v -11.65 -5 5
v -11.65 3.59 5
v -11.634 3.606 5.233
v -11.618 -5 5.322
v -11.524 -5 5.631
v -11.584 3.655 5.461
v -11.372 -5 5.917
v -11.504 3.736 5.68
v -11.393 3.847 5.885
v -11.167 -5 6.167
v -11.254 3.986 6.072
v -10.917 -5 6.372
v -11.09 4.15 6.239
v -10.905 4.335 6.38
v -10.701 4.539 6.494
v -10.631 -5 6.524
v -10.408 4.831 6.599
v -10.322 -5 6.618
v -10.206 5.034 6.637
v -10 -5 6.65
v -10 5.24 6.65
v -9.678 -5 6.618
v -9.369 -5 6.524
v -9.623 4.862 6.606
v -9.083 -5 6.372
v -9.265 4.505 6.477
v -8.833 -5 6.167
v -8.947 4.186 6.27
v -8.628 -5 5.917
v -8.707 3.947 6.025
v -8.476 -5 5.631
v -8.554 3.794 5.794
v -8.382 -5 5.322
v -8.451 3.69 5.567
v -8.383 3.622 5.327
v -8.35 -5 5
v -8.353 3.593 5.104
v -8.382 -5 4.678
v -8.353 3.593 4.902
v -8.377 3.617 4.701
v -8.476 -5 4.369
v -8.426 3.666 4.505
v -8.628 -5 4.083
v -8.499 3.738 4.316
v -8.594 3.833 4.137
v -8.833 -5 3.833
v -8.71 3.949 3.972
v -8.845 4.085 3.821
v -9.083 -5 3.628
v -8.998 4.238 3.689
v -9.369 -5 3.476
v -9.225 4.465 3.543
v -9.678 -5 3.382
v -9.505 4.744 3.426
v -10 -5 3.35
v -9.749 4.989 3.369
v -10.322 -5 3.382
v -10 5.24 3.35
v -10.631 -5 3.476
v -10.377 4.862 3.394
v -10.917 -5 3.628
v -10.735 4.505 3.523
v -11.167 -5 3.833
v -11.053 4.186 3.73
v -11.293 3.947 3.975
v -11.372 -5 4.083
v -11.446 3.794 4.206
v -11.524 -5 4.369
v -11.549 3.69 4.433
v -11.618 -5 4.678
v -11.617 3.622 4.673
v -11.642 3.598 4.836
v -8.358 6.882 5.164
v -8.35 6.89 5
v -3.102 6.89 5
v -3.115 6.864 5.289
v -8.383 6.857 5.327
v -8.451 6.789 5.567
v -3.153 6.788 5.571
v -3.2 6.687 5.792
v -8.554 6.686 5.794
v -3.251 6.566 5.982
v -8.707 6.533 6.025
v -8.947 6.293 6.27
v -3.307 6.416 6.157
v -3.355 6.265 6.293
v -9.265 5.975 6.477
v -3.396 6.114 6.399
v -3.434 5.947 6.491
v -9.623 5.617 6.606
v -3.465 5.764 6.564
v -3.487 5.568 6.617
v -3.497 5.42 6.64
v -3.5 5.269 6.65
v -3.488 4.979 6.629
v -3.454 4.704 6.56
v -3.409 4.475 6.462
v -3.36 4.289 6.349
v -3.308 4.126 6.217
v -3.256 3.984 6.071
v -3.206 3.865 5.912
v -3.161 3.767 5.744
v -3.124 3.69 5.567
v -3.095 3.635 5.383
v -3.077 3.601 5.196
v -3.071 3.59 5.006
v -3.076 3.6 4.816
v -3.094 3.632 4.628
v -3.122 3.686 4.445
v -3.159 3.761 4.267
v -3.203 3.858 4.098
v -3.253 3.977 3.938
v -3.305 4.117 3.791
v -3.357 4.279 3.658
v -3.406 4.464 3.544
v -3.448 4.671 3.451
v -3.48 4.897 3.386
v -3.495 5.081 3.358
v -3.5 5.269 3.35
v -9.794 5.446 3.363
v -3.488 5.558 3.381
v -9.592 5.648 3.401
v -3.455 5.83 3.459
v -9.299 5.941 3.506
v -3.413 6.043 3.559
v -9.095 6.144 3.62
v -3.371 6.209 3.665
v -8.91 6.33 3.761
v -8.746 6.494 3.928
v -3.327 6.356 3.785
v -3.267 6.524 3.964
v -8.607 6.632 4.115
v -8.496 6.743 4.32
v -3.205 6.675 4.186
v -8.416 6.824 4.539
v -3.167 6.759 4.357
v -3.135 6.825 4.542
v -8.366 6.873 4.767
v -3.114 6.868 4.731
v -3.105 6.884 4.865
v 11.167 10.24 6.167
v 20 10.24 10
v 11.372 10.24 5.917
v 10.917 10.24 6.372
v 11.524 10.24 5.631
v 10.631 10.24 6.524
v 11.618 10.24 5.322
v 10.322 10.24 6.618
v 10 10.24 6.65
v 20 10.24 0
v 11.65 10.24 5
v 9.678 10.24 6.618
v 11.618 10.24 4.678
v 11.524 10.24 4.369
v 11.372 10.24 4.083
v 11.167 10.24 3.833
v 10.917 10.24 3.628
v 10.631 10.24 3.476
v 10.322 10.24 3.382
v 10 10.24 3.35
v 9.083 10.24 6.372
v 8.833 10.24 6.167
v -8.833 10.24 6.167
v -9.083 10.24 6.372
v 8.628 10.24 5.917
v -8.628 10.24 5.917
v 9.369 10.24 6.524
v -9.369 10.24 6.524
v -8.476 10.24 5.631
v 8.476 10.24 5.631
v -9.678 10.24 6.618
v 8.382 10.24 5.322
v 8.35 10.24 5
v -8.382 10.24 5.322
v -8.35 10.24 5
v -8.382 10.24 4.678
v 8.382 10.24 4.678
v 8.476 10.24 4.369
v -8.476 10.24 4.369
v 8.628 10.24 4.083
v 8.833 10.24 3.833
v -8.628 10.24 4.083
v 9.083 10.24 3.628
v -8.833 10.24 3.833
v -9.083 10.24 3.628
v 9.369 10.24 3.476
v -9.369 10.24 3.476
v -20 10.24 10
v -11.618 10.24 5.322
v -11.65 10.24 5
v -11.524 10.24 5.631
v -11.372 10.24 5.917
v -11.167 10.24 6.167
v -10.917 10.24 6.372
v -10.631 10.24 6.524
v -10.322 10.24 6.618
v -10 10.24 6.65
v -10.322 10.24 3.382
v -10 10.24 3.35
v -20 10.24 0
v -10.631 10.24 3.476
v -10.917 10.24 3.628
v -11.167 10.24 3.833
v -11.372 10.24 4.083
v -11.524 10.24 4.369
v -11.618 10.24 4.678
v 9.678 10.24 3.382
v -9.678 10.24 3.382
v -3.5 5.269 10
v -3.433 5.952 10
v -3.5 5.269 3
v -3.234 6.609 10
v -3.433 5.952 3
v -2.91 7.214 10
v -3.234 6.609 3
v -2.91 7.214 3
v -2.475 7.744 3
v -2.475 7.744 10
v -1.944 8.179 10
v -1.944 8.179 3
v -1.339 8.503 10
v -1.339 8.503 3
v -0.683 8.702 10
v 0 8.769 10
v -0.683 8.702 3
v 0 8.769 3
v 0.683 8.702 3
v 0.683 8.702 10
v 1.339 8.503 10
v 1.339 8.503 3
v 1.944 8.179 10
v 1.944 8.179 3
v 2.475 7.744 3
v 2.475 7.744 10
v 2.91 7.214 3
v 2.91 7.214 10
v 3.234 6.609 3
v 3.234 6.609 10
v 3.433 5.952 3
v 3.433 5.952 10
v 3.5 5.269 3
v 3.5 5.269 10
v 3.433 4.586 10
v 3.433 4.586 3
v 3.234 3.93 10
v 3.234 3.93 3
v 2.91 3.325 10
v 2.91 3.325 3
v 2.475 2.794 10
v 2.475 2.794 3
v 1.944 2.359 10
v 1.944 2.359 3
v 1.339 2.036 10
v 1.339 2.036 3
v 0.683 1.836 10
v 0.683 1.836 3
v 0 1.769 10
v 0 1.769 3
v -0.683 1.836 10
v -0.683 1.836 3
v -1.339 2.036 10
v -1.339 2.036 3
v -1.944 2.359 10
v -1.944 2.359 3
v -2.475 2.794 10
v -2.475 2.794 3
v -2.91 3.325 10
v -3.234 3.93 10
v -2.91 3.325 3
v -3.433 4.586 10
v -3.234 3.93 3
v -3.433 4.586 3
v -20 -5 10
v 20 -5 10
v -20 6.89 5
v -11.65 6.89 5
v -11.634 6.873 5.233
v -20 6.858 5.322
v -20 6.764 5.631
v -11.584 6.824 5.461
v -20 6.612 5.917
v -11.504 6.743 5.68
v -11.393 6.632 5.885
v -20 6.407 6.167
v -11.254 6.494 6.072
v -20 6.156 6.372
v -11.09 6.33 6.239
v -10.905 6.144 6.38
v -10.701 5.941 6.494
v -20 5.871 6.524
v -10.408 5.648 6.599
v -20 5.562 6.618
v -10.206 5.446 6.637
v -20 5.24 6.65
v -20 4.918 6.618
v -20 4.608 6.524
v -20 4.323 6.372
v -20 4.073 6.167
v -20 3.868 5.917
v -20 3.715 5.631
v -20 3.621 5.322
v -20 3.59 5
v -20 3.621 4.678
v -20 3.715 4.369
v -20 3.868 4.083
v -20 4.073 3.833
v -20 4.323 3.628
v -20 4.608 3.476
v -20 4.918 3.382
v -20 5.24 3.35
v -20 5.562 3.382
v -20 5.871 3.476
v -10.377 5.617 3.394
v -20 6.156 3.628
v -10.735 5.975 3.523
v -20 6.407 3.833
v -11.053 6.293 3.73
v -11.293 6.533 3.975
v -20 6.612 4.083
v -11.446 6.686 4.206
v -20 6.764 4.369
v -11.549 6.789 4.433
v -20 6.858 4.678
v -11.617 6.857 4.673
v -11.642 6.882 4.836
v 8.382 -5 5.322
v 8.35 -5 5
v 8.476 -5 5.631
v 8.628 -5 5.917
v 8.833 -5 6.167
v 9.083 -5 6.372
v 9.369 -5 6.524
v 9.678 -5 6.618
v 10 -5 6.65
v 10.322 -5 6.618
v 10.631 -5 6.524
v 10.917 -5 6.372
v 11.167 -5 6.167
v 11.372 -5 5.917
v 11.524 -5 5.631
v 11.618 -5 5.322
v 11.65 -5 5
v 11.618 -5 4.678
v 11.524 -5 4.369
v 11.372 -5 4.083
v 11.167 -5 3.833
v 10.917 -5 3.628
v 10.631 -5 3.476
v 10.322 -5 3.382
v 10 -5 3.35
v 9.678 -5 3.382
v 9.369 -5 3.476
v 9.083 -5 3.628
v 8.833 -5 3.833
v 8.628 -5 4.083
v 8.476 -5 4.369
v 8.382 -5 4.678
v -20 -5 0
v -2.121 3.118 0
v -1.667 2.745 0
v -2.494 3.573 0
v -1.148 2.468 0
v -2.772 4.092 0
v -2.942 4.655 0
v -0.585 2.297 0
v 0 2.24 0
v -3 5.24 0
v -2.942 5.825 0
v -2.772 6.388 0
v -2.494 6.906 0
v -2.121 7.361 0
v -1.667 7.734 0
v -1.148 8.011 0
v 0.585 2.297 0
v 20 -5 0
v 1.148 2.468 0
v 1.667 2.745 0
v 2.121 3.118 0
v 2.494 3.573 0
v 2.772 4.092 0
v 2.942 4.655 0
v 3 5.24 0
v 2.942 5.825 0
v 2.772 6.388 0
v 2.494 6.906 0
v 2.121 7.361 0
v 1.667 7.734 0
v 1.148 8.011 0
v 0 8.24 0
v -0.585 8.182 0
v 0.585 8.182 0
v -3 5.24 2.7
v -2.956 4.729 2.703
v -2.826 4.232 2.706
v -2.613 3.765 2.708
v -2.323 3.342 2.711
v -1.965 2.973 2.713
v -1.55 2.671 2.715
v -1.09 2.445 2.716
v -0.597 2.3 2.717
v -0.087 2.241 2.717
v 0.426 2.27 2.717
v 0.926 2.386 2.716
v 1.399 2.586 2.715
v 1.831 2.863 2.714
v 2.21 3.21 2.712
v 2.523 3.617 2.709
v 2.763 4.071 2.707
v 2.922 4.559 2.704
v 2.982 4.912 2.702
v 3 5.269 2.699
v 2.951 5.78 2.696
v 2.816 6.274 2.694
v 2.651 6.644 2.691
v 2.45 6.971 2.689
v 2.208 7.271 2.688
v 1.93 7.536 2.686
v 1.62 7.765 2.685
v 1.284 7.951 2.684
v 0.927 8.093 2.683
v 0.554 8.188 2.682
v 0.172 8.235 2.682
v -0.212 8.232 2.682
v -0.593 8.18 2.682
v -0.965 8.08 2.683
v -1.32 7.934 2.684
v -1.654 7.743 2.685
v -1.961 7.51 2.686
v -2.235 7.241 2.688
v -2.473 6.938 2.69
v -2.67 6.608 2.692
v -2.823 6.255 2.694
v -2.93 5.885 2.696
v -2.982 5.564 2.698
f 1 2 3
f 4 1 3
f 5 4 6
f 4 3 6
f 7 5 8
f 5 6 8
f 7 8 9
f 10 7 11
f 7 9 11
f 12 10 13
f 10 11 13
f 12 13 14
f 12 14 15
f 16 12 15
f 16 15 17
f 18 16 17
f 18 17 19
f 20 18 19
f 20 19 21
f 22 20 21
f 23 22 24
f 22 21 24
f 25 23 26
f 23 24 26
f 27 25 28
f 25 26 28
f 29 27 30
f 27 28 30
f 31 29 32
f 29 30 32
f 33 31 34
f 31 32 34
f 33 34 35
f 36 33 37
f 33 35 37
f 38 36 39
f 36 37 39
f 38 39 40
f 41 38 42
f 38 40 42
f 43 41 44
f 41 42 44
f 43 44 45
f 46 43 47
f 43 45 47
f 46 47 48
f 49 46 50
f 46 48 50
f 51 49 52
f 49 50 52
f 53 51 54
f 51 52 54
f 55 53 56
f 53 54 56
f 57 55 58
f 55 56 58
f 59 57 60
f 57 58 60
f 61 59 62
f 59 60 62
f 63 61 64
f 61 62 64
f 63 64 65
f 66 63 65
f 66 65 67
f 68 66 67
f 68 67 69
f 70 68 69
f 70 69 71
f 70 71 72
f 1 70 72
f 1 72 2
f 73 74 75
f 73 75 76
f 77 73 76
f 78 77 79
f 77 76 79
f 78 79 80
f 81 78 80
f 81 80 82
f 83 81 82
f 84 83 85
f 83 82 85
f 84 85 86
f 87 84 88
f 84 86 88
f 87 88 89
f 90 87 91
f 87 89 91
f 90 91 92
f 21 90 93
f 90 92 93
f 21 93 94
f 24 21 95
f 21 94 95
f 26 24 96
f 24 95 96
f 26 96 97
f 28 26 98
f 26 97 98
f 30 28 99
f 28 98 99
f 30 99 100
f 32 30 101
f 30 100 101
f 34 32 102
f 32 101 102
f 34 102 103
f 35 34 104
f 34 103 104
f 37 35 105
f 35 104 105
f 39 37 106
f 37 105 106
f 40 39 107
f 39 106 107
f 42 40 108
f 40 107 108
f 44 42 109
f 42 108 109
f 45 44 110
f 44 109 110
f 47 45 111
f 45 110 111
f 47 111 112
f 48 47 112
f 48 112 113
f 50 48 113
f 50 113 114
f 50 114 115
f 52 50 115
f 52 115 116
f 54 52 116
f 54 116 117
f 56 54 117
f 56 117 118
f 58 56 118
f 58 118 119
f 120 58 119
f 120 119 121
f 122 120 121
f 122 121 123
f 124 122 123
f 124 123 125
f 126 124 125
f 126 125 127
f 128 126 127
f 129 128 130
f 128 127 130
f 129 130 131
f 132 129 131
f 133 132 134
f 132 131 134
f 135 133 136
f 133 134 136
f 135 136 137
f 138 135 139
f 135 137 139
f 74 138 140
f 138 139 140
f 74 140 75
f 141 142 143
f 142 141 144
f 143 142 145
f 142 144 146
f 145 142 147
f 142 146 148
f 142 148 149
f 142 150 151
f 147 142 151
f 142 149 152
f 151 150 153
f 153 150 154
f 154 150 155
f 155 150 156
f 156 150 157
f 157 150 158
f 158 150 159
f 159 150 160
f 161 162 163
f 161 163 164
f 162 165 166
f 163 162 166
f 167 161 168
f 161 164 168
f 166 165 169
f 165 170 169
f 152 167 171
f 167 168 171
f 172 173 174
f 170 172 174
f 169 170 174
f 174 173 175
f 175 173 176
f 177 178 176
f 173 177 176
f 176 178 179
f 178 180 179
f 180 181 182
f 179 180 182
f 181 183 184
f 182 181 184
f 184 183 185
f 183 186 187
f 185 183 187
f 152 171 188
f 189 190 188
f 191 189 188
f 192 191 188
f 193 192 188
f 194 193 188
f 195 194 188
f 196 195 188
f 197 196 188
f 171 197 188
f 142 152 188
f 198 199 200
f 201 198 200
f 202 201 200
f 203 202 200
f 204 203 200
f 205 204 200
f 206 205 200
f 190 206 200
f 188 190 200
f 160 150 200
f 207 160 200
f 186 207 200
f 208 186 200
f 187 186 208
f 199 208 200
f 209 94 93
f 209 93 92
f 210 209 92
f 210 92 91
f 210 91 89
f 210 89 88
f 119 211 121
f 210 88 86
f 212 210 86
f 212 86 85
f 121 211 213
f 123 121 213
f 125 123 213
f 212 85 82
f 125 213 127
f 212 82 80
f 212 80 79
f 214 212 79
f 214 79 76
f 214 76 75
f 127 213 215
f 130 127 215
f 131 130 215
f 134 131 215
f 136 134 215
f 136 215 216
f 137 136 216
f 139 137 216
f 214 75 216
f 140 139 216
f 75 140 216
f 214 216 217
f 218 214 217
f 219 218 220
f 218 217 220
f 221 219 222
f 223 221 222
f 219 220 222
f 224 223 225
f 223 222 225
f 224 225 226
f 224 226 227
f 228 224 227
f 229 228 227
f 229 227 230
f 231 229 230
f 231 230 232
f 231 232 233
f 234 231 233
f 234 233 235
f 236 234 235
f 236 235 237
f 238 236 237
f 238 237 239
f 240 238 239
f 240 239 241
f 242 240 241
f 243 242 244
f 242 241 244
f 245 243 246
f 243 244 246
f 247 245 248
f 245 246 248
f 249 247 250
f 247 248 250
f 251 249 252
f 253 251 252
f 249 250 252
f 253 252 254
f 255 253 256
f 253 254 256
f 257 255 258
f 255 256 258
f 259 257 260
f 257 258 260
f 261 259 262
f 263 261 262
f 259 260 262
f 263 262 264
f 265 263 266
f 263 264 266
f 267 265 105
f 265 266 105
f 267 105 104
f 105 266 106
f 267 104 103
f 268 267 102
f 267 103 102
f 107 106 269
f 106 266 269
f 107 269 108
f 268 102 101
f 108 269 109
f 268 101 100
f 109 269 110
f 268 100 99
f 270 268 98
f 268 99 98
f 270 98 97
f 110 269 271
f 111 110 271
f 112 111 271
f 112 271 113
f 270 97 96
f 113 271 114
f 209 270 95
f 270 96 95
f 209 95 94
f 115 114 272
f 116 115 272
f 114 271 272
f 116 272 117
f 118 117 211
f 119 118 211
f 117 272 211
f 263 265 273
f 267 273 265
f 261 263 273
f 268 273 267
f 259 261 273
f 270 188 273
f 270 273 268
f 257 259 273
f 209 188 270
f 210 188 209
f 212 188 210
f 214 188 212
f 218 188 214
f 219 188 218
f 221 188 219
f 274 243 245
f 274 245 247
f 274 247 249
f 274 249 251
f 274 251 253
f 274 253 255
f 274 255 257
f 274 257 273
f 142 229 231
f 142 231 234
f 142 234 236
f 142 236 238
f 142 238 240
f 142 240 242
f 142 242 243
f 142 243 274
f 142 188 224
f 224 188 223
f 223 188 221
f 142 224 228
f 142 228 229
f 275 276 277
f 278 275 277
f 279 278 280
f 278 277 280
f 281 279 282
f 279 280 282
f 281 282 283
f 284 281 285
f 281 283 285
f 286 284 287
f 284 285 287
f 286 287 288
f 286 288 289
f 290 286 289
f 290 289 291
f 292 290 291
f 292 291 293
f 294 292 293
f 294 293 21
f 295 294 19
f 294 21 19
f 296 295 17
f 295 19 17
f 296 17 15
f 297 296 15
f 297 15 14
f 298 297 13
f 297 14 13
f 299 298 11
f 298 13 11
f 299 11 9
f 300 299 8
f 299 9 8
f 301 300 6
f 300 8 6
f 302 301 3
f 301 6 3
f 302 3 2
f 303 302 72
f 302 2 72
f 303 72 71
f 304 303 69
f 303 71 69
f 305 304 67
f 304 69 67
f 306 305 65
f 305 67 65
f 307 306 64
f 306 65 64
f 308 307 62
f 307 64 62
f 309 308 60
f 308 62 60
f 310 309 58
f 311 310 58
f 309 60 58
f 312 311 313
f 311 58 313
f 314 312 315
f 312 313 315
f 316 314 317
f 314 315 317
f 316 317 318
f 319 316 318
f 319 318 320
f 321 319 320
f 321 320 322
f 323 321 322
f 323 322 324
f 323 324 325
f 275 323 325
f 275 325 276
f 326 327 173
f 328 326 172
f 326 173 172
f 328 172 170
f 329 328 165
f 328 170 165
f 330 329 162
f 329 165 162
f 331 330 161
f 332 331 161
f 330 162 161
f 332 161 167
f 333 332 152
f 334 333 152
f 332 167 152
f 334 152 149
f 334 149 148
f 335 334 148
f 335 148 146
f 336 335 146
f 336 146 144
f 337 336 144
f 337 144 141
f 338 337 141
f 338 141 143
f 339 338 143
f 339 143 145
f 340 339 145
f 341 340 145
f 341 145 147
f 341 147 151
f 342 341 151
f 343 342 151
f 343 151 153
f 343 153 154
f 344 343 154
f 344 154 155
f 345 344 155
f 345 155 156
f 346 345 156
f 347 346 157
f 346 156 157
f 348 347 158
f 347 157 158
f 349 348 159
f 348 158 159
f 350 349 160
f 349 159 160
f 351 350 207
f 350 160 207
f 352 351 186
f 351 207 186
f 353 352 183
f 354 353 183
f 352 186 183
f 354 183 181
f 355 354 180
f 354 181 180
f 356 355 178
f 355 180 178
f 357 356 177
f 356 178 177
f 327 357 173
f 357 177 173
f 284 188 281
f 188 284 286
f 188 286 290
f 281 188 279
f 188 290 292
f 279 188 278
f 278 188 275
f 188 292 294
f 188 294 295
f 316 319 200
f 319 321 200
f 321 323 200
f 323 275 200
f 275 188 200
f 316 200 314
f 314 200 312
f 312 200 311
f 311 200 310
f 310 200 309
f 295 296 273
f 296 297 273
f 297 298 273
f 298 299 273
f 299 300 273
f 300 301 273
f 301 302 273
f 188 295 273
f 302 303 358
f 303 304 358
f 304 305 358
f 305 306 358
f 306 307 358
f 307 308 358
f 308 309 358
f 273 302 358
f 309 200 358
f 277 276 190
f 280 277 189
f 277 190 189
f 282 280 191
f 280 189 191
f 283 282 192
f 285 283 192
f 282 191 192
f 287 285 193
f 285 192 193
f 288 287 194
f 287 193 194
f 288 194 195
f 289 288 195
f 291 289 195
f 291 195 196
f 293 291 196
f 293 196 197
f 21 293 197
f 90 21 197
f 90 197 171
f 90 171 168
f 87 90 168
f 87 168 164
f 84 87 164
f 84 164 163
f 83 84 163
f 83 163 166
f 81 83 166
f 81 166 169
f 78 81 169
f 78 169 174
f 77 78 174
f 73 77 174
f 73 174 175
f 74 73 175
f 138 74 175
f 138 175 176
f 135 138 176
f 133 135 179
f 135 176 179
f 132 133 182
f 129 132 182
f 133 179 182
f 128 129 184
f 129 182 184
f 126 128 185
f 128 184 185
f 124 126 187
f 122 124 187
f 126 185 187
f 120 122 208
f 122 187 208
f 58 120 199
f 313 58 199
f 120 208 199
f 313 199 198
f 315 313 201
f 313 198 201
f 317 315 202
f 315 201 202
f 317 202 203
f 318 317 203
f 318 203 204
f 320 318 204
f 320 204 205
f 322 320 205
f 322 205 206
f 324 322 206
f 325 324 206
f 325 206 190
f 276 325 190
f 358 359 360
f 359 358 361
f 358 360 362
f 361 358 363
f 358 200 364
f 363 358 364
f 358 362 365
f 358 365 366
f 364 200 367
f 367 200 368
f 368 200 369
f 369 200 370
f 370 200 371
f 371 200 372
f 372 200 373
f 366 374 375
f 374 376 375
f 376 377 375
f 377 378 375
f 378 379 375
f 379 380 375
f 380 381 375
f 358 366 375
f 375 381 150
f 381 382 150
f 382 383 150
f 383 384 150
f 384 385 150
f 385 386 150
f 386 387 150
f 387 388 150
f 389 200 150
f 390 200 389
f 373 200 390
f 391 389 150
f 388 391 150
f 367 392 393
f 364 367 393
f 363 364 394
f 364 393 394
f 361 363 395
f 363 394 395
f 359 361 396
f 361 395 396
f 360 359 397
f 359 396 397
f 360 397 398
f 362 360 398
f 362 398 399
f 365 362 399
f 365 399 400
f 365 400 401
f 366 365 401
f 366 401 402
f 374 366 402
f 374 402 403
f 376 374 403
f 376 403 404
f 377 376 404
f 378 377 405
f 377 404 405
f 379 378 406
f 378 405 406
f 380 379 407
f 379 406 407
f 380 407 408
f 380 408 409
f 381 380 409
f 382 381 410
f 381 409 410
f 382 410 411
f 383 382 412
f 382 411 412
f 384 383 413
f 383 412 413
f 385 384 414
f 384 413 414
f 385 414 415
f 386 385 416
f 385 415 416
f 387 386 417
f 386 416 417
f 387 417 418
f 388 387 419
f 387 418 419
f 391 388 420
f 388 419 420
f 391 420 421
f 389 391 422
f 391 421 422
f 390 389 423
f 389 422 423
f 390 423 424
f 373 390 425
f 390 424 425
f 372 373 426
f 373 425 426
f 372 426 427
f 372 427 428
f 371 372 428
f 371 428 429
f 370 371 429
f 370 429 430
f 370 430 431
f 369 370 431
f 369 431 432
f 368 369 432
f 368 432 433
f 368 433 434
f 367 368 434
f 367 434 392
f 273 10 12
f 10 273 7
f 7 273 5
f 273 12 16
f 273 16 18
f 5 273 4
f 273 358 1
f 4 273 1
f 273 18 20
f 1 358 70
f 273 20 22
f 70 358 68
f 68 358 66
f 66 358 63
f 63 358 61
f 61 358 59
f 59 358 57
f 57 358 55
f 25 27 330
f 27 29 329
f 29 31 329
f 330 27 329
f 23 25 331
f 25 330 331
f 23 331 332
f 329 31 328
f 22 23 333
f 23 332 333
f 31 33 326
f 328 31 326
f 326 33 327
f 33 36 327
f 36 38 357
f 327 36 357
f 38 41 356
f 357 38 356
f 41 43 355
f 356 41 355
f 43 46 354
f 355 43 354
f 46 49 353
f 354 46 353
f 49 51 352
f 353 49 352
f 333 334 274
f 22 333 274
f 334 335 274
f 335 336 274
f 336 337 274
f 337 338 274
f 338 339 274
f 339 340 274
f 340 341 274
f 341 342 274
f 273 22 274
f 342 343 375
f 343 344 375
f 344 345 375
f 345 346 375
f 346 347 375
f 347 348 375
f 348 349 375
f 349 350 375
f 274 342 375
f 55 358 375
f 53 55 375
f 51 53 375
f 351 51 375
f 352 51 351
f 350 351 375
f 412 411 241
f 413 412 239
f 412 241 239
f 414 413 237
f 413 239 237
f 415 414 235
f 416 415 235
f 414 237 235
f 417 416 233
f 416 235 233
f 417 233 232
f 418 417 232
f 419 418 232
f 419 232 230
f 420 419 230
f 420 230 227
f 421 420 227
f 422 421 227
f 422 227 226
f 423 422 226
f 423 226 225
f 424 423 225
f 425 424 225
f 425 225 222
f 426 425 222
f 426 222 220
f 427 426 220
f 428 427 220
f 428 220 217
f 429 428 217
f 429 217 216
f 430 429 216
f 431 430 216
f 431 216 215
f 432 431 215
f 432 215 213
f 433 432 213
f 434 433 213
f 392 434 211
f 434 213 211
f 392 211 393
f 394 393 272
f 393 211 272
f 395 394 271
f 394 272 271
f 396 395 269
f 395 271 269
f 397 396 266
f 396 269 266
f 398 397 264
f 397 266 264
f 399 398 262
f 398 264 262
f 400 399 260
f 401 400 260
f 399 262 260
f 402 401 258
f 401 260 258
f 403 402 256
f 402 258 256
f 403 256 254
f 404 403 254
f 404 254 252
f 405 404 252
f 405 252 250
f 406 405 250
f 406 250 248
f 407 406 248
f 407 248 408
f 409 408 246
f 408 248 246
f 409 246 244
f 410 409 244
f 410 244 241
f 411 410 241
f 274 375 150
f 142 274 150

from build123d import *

# Parameters (mm, degrees)
F1_DEPTH = 10
F2_D     = 6
F4_D     = 3.3
F4_DEPTH = 15.5
F4_TIP   = 0.9914200214
F6_D     = 3.3
F6_DEPTH = 20
F6_TIP   = 0.9914200214
F9_D     = 7
F9_DEPTH = 7
F9_TIP   = 2.1030121666


with BuildPart() as f1:
    # F0 (on Top) → F1 (new body)
    with BuildSketch(Plane.XY):
        Polygon((-20, 10.239787288), (-20, -5), (20, -5), (20, 10.239787288), (12, 10.239787288), (10.6523660943, 10.239787288), (-9.4155045226, 10.239787288), (-12, 10.239787288), align=None)
    extrude(amount=F1_DEPTH)

    # F2 (through all)
    with Locations(Plane(origin=(0, 0, 0), x_dir=(1, 0, 0), z_dir=(0, 0, -1))):
        with Locations((0, -5.239787288)):
            Hole(F2_D / 2)

    # F4
    with Locations(Plane.XZ.offset(5)):
        with Locations((-10, 5), (10, 5)):
            Hole(F4_D / 2, depth=F4_DEPTH)
            with Locations((0, 0, -(F4_DEPTH + F4_TIP / 2))):  # 118° drill point
                Cone(0, F4_D / 2, F4_TIP, mode=Mode.SUBTRACT)

    # F6
    with Locations(Plane(origin=(-20, 0, 0), x_dir=(0, -1, 0), z_dir=(-1, 0, 0))):
        with Locations((-5.239787288, 5)):
            Hole(F6_D / 2, depth=F6_DEPTH)
            with Locations((0, 0, -(F6_DEPTH + F6_TIP / 2))):  # 118° drill point
                Cone(0, F6_D / 2, F6_TIP, mode=Mode.SUBTRACT)

    # F9
    with Locations(Plane.XY.offset(10)):
        with Locations((0, 5.2691735327)):
            Hole(F9_D / 2, depth=F9_DEPTH)
            with Locations((0, 0, -(F9_DEPTH + F9_TIP / 2))):  # 118° drill point
                Cone(0, F9_D / 2, F9_TIP, mode=Mode.SUBTRACT)


solid = f1.part
